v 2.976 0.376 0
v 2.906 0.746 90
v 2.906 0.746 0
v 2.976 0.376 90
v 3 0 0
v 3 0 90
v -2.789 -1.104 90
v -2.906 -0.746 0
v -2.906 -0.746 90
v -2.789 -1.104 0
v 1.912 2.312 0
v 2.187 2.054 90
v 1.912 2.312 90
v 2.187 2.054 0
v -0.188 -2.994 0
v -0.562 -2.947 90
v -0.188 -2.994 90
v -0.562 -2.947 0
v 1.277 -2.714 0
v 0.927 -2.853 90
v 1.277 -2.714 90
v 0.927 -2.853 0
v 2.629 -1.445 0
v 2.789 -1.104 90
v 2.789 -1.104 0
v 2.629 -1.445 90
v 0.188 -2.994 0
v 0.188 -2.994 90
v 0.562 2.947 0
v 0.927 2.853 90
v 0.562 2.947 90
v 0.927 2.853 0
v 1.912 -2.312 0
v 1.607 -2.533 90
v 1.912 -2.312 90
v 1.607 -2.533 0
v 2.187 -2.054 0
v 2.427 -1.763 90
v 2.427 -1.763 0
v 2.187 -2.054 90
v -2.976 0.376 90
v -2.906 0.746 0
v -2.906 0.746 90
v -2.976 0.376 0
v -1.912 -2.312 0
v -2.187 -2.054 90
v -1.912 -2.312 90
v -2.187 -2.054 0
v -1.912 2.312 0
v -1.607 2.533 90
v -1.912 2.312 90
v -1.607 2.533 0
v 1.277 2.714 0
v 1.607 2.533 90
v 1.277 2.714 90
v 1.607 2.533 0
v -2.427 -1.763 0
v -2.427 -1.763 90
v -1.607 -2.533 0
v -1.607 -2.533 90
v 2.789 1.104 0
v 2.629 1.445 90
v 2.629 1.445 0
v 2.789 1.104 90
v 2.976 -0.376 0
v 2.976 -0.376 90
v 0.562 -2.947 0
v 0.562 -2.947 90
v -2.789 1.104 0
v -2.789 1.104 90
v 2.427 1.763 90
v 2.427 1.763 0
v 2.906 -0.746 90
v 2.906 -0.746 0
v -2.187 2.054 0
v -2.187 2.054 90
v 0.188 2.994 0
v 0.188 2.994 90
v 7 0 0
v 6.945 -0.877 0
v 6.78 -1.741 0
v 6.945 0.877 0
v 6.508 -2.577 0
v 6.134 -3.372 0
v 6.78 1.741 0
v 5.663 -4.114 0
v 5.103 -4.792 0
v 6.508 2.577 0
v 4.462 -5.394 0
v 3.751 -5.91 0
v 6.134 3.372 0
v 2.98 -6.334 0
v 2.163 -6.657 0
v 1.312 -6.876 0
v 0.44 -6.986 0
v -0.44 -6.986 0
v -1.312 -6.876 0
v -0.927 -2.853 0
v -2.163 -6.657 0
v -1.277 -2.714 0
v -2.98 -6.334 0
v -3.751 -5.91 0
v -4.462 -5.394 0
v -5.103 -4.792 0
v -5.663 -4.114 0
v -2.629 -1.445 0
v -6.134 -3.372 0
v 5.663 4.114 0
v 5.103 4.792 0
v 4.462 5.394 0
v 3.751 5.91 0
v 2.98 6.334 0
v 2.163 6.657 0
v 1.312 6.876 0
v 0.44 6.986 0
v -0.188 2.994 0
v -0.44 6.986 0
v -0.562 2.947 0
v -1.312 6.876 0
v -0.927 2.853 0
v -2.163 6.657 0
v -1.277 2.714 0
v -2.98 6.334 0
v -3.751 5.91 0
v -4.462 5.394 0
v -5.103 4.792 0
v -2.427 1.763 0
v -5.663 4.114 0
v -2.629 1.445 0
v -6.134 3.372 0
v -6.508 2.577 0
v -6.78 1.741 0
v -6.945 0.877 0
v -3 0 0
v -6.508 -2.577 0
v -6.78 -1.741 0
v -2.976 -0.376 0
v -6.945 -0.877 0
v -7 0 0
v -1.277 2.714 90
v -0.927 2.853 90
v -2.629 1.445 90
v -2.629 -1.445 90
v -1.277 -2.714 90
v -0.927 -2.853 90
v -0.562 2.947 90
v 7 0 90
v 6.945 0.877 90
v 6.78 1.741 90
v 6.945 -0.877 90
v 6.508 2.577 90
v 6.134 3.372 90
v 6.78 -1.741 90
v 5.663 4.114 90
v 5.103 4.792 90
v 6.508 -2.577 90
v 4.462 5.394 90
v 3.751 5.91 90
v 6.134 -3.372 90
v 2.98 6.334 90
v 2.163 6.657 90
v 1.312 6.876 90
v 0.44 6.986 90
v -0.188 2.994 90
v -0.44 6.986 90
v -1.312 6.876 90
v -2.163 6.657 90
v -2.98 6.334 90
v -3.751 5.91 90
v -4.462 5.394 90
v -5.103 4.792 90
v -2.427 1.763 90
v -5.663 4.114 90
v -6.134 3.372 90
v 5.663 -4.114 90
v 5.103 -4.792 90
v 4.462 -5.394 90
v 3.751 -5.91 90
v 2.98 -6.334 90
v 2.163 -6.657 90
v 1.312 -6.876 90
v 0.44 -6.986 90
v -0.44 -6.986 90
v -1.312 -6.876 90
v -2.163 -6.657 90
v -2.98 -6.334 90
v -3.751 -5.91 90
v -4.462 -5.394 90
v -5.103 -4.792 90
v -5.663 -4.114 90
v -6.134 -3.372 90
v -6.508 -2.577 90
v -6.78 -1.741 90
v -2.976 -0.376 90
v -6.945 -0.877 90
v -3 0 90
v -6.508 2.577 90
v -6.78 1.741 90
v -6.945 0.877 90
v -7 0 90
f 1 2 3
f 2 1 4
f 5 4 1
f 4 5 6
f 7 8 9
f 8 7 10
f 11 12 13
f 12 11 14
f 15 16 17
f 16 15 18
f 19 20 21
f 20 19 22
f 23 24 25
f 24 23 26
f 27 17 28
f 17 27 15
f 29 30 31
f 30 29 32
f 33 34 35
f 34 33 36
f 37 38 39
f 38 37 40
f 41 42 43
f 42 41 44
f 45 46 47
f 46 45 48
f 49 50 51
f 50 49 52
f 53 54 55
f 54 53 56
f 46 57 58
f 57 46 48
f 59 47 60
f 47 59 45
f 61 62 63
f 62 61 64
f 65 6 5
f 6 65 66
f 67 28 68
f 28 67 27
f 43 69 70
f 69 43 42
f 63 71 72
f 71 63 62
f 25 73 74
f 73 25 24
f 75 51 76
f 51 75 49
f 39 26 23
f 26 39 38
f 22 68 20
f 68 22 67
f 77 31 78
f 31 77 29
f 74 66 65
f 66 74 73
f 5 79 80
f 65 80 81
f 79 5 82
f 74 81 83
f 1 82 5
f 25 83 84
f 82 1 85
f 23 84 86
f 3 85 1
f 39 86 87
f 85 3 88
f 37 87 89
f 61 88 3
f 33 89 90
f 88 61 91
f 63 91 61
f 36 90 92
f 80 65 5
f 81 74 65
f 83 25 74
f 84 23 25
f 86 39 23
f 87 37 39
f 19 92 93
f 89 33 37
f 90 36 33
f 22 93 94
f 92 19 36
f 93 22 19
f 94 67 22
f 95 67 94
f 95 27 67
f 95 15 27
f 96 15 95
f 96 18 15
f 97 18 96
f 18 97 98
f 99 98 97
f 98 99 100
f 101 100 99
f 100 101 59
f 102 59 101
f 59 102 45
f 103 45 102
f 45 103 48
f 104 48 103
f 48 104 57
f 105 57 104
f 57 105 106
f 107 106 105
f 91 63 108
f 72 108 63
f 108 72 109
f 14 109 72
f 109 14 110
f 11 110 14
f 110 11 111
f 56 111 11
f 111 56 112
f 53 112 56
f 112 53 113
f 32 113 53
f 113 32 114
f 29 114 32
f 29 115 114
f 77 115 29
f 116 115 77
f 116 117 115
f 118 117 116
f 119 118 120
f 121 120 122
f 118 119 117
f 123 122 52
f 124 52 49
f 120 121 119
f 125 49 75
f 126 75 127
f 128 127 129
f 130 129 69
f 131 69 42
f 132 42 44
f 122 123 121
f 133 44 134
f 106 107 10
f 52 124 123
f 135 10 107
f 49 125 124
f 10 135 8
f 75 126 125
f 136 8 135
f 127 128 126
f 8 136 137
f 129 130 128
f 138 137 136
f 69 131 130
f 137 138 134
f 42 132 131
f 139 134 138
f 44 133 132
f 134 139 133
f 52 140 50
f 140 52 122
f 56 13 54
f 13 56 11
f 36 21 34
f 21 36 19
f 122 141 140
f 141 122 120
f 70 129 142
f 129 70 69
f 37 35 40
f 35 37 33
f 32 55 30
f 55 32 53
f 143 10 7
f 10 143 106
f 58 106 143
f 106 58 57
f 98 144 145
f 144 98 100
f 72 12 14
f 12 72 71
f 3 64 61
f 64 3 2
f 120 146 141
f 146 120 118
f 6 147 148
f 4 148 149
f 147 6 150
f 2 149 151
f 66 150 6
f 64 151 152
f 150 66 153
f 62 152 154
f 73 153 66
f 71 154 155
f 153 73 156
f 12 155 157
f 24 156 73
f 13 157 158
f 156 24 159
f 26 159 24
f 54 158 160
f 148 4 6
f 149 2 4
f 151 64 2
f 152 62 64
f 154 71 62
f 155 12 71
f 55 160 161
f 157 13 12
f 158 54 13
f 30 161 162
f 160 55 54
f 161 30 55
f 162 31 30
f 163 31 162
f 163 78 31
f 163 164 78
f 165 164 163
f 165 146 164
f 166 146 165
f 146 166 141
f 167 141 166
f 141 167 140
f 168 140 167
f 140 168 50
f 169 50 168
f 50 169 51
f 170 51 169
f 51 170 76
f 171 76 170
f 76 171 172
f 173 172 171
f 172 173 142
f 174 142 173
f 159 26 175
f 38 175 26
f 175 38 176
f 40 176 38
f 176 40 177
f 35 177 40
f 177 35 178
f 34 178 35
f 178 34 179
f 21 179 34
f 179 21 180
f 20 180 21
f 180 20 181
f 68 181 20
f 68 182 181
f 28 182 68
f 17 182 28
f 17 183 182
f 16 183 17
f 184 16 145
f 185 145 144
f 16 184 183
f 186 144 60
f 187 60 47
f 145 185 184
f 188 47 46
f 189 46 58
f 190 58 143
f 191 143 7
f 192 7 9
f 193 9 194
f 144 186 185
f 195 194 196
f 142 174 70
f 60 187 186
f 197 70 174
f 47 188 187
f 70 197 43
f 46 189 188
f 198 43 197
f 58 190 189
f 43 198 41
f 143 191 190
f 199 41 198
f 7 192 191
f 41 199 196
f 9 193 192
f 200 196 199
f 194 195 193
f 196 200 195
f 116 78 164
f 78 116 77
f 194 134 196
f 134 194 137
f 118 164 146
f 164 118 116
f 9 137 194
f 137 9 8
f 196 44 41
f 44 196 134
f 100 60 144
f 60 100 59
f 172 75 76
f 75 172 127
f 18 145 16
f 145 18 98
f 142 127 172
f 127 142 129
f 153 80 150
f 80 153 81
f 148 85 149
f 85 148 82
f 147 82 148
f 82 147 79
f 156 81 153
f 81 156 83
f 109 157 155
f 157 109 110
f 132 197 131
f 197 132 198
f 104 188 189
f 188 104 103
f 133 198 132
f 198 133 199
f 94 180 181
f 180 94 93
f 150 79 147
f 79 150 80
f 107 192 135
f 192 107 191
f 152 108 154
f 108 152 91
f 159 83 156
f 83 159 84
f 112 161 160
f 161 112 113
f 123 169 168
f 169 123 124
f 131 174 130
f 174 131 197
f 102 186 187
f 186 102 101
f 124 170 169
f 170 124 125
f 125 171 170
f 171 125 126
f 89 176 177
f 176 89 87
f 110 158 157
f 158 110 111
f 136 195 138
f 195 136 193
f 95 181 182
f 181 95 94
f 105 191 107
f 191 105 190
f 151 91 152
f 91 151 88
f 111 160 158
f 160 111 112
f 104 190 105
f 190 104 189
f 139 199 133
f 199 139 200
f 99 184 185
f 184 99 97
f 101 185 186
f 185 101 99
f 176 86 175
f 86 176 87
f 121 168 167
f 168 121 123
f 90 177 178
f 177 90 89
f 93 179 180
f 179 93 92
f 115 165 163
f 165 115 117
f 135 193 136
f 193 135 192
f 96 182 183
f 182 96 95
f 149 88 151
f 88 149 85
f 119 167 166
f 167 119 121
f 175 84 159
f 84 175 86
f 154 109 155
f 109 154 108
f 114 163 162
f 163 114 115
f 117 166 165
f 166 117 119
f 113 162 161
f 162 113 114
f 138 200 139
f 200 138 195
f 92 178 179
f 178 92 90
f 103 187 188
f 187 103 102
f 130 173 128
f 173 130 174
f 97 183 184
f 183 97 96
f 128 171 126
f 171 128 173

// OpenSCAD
$fn = 50;


difference() {
	union() {
		cylinder(h = 90, r = 7.0000000000);
	}
	union() {
		cylinder(h = 90, r = 3.0000000000);
		cylinder(h = 90, r = 1.5000000000);
		cylinder(h = 90, r = 1.5000000000);
		cylinder(h = 90, r = 1.5000000000);
	}
}
